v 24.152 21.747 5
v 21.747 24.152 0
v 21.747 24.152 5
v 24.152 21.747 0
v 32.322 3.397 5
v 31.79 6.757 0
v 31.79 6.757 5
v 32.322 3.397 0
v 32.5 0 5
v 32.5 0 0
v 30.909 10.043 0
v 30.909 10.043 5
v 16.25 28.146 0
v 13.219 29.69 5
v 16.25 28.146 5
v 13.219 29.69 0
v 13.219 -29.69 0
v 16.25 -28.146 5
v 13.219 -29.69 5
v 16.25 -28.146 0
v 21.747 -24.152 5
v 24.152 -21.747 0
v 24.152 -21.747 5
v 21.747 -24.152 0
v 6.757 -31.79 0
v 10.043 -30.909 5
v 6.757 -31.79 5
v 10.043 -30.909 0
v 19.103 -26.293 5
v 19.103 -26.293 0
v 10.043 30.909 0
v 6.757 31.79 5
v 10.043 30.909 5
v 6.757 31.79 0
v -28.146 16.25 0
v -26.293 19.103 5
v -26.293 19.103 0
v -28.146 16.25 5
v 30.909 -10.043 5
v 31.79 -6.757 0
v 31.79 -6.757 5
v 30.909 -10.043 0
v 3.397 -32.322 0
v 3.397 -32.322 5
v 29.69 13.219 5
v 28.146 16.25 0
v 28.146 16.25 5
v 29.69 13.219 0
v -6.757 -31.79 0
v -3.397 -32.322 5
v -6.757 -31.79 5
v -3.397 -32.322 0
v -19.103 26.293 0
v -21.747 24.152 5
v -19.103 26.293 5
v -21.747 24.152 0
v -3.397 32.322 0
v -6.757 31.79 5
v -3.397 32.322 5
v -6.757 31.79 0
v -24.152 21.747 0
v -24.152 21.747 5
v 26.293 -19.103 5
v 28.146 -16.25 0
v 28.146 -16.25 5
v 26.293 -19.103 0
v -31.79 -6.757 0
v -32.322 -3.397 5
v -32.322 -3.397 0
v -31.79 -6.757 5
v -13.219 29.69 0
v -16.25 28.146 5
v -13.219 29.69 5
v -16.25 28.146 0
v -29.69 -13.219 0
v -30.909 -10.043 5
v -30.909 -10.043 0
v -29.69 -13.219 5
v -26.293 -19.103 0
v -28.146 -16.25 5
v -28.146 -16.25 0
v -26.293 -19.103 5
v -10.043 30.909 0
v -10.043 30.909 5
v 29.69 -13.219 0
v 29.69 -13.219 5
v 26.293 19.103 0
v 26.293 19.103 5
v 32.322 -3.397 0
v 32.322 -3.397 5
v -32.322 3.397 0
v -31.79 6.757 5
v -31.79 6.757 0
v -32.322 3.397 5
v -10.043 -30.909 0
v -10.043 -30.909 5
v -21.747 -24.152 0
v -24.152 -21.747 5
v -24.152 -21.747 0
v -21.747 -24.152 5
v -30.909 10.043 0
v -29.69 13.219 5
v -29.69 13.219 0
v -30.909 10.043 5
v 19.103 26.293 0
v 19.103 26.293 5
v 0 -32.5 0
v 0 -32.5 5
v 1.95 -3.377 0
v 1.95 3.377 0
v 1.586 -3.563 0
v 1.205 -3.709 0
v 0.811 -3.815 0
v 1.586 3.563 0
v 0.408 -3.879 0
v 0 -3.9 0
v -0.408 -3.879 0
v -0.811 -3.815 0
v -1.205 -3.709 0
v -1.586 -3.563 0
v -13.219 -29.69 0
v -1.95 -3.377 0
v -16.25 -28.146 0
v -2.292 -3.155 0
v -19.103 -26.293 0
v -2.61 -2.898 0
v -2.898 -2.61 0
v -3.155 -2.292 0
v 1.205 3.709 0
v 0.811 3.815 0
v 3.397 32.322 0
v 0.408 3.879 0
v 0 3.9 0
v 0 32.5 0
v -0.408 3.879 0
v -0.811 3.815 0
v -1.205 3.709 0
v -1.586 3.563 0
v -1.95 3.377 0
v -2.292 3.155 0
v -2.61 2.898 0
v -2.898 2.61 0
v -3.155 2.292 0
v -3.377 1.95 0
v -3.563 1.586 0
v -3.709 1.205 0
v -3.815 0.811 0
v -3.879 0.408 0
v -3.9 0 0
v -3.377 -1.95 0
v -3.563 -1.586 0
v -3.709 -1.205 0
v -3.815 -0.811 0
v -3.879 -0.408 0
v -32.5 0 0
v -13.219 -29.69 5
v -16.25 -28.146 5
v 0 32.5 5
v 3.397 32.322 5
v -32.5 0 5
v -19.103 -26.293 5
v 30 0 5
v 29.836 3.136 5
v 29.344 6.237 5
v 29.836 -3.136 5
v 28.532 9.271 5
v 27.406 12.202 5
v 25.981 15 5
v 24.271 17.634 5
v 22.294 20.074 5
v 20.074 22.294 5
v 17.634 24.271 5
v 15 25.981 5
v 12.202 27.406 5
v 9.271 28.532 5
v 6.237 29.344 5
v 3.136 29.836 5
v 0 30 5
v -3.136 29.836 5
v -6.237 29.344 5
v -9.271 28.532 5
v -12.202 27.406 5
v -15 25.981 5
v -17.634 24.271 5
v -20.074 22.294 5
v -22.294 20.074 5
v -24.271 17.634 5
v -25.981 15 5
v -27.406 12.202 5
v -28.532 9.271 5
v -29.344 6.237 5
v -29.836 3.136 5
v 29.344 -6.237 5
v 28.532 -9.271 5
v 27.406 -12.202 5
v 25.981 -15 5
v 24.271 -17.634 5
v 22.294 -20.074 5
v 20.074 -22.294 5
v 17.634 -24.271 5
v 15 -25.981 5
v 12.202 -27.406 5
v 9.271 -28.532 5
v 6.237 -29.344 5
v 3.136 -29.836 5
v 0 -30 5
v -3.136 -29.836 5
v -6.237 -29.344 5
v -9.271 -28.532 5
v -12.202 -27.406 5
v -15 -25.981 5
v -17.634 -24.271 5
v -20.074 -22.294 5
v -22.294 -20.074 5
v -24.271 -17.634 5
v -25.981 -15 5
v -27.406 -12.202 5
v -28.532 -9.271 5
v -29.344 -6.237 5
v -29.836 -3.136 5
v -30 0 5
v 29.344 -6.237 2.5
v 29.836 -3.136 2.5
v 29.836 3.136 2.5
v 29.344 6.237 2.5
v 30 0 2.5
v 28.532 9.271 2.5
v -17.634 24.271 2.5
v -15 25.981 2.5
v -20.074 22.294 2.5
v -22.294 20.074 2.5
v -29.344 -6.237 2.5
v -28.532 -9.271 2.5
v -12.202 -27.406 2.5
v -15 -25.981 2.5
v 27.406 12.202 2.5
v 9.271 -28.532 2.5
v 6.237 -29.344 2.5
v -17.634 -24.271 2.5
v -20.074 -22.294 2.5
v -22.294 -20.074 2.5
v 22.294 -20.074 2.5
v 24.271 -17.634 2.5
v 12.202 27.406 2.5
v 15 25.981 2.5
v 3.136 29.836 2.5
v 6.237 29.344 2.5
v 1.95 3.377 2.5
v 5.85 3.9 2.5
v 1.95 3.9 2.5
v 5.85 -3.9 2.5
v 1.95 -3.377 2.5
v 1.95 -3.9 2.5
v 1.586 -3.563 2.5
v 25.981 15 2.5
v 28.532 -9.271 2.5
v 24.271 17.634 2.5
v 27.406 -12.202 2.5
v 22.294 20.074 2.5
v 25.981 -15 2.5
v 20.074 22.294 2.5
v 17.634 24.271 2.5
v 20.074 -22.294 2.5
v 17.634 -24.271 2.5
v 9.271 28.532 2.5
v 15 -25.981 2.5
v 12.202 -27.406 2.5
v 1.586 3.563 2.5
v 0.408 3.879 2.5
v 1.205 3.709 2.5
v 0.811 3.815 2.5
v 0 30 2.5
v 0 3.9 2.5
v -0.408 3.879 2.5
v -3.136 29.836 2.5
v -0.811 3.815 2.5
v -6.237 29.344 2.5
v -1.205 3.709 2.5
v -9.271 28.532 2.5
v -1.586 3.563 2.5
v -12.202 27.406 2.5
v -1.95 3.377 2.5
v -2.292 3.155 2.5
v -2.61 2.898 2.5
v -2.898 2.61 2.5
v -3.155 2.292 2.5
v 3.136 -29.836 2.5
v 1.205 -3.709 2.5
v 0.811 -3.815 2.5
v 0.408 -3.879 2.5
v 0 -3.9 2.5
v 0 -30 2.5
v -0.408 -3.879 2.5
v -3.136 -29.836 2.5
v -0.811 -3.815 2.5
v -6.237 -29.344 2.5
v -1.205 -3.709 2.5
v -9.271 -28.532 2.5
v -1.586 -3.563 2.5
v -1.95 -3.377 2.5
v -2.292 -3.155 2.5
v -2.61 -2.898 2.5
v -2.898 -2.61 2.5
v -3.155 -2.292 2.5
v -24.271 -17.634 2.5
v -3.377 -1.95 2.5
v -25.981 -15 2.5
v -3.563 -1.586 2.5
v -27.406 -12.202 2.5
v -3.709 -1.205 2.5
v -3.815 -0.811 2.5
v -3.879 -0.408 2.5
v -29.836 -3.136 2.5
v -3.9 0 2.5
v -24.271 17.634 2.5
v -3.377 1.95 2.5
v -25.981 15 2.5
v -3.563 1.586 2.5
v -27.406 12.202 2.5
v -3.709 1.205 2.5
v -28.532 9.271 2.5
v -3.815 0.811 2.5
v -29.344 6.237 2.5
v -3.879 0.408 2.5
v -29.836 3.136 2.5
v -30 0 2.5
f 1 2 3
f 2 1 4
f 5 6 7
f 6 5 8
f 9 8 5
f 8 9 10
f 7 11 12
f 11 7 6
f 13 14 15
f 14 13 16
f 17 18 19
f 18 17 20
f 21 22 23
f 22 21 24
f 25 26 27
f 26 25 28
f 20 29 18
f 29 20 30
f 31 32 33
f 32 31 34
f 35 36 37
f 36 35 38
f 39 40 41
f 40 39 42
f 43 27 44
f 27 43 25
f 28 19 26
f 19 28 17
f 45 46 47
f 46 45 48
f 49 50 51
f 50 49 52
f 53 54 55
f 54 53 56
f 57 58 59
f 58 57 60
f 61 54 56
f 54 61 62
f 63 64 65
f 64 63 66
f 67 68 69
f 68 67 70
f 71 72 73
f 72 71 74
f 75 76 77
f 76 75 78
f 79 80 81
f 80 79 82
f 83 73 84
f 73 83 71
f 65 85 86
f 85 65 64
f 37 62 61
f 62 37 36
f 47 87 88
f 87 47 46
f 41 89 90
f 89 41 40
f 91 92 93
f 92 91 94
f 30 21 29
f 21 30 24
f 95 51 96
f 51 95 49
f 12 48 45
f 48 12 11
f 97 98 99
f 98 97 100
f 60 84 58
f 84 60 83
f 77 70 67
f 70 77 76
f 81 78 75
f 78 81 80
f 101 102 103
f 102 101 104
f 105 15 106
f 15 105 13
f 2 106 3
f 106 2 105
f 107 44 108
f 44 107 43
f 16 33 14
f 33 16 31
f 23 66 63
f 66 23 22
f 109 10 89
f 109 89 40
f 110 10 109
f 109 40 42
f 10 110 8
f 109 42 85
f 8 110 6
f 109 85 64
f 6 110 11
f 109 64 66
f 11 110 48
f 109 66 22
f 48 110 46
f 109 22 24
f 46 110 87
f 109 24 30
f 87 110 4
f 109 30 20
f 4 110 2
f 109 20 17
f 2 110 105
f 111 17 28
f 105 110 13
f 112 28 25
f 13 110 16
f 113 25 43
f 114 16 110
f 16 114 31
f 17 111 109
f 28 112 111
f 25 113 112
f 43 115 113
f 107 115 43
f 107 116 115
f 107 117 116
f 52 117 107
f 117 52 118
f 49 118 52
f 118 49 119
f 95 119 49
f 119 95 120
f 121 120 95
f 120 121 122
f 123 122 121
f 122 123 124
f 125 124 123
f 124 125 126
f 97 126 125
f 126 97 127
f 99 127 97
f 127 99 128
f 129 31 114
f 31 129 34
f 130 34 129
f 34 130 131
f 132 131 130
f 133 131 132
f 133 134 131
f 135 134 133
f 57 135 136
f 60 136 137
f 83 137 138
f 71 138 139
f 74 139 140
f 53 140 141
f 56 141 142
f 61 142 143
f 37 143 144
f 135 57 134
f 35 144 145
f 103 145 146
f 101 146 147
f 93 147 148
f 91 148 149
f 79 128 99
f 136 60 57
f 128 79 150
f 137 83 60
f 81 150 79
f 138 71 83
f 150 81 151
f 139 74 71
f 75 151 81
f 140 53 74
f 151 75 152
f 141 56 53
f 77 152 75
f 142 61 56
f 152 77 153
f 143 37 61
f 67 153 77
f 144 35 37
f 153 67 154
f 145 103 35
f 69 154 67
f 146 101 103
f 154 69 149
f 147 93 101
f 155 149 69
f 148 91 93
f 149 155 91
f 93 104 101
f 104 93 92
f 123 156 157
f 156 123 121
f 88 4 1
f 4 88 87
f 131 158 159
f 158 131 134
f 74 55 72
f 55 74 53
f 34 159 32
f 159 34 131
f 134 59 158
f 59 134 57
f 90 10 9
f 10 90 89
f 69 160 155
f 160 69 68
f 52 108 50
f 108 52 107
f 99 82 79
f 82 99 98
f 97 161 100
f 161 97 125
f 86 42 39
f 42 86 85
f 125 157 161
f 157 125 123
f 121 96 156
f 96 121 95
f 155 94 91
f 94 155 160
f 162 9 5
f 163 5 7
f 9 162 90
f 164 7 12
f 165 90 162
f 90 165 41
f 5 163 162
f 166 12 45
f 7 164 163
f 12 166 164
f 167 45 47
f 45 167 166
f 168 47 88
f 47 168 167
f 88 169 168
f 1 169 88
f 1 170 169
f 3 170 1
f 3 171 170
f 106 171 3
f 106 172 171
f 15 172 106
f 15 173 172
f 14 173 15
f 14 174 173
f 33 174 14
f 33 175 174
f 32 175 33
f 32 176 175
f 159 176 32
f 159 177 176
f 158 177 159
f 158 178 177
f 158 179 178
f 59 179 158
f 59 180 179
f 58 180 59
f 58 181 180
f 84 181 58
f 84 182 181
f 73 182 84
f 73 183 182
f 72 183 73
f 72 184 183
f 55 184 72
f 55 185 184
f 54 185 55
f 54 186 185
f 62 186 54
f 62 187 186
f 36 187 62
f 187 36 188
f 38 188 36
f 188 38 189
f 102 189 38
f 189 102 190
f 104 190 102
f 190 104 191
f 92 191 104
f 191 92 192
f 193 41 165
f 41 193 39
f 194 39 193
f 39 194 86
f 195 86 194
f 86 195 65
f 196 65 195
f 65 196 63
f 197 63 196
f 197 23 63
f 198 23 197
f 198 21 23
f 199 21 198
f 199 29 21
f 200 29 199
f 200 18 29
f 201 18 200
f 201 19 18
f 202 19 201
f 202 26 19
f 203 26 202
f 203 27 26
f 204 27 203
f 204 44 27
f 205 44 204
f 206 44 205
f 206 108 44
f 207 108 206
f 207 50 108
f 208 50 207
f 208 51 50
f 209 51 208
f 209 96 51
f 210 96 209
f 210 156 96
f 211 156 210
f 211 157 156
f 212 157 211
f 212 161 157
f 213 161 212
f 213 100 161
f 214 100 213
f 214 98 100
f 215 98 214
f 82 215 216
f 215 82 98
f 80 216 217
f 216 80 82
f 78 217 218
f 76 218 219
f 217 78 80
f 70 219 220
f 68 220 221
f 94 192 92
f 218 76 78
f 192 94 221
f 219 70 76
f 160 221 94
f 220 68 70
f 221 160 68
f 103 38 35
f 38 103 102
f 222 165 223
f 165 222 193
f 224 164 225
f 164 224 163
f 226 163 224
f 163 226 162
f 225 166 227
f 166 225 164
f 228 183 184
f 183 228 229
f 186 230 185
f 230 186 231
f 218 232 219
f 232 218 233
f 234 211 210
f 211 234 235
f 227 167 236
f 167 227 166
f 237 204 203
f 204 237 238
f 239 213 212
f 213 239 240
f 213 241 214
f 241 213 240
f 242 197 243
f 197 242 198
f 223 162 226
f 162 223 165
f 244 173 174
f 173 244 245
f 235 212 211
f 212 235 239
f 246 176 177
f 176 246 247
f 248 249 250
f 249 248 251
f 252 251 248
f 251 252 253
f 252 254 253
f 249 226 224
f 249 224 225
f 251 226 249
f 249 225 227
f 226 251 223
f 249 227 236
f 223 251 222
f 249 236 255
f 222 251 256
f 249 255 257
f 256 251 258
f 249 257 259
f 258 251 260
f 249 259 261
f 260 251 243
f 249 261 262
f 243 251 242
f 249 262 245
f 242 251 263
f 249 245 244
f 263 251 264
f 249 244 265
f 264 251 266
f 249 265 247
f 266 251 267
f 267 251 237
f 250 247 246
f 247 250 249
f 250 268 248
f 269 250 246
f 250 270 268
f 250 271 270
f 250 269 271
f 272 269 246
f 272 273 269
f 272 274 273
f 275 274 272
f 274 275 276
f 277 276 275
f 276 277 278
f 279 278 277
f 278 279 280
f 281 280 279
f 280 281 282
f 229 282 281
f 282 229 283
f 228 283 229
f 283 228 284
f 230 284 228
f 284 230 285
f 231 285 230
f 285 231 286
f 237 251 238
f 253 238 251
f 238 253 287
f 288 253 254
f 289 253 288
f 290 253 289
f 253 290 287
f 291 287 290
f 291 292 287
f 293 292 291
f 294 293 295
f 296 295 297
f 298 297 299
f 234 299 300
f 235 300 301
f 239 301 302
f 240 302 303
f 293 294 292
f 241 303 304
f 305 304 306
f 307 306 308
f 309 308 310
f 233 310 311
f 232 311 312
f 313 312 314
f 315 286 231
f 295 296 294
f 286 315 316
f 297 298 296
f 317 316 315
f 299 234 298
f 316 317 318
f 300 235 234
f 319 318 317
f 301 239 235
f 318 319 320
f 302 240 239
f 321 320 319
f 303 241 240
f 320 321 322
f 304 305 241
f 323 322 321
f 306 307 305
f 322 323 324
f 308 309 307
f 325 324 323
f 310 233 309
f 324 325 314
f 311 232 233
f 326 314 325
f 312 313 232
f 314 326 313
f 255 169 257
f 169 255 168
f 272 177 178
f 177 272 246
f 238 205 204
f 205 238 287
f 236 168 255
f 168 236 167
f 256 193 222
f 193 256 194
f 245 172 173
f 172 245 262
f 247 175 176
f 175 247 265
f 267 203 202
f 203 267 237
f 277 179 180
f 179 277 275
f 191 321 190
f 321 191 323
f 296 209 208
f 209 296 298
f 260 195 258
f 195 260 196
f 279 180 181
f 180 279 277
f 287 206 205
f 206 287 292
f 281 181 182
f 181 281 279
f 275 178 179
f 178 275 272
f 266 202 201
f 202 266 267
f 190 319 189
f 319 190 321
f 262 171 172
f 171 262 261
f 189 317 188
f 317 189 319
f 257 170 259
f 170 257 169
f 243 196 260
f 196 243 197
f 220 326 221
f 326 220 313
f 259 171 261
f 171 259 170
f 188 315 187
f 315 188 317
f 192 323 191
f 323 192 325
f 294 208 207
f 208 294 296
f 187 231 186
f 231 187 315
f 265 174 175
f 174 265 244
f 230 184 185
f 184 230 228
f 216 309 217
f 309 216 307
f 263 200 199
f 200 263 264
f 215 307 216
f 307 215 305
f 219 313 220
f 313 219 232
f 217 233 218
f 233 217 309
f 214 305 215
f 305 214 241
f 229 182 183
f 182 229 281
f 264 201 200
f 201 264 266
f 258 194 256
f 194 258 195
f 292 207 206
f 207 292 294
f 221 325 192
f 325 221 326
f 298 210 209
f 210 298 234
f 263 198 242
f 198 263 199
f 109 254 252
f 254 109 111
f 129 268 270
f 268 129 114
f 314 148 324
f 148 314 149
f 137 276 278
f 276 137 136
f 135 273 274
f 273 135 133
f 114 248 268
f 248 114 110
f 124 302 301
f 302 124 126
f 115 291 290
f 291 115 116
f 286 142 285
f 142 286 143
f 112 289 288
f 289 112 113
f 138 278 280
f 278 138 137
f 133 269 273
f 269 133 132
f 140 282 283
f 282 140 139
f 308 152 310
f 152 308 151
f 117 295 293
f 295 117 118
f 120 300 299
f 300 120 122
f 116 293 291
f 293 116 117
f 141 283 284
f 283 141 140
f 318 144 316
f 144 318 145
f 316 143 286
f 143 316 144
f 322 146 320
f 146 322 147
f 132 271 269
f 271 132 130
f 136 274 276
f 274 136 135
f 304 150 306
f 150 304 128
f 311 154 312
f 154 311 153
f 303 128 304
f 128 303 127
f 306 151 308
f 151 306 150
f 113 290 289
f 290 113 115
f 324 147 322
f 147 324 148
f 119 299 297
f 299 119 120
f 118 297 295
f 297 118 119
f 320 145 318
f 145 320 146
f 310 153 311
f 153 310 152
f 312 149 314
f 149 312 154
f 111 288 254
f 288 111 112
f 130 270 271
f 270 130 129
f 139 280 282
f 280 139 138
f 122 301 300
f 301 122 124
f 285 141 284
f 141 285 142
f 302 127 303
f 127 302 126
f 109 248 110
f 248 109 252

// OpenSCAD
// robot wheel for gear motors
$fn = 60;
diameter = 65;
rim_thickness = 5;
rim_diameter = 5; // subtracted from total diameter
disc_thickness = 2.5; 
axle_radius = 3.9;
keyway_offset = axle_radius / 2;

union(){
difference(){
cylinder(h = rim_thickness, r = diameter/2);
translate([0,0,disc_thickness])
    cylinder(h = disc_thickness, r = (diameter-rim_diameter)/2);
    
cylinder(h = disc_thickness, r = axle_radius);
}
translate([keyway_offset, -axle_radius, 0])
    cube([axle_radius, 2*axle_radius, disc_thickness]);
}
